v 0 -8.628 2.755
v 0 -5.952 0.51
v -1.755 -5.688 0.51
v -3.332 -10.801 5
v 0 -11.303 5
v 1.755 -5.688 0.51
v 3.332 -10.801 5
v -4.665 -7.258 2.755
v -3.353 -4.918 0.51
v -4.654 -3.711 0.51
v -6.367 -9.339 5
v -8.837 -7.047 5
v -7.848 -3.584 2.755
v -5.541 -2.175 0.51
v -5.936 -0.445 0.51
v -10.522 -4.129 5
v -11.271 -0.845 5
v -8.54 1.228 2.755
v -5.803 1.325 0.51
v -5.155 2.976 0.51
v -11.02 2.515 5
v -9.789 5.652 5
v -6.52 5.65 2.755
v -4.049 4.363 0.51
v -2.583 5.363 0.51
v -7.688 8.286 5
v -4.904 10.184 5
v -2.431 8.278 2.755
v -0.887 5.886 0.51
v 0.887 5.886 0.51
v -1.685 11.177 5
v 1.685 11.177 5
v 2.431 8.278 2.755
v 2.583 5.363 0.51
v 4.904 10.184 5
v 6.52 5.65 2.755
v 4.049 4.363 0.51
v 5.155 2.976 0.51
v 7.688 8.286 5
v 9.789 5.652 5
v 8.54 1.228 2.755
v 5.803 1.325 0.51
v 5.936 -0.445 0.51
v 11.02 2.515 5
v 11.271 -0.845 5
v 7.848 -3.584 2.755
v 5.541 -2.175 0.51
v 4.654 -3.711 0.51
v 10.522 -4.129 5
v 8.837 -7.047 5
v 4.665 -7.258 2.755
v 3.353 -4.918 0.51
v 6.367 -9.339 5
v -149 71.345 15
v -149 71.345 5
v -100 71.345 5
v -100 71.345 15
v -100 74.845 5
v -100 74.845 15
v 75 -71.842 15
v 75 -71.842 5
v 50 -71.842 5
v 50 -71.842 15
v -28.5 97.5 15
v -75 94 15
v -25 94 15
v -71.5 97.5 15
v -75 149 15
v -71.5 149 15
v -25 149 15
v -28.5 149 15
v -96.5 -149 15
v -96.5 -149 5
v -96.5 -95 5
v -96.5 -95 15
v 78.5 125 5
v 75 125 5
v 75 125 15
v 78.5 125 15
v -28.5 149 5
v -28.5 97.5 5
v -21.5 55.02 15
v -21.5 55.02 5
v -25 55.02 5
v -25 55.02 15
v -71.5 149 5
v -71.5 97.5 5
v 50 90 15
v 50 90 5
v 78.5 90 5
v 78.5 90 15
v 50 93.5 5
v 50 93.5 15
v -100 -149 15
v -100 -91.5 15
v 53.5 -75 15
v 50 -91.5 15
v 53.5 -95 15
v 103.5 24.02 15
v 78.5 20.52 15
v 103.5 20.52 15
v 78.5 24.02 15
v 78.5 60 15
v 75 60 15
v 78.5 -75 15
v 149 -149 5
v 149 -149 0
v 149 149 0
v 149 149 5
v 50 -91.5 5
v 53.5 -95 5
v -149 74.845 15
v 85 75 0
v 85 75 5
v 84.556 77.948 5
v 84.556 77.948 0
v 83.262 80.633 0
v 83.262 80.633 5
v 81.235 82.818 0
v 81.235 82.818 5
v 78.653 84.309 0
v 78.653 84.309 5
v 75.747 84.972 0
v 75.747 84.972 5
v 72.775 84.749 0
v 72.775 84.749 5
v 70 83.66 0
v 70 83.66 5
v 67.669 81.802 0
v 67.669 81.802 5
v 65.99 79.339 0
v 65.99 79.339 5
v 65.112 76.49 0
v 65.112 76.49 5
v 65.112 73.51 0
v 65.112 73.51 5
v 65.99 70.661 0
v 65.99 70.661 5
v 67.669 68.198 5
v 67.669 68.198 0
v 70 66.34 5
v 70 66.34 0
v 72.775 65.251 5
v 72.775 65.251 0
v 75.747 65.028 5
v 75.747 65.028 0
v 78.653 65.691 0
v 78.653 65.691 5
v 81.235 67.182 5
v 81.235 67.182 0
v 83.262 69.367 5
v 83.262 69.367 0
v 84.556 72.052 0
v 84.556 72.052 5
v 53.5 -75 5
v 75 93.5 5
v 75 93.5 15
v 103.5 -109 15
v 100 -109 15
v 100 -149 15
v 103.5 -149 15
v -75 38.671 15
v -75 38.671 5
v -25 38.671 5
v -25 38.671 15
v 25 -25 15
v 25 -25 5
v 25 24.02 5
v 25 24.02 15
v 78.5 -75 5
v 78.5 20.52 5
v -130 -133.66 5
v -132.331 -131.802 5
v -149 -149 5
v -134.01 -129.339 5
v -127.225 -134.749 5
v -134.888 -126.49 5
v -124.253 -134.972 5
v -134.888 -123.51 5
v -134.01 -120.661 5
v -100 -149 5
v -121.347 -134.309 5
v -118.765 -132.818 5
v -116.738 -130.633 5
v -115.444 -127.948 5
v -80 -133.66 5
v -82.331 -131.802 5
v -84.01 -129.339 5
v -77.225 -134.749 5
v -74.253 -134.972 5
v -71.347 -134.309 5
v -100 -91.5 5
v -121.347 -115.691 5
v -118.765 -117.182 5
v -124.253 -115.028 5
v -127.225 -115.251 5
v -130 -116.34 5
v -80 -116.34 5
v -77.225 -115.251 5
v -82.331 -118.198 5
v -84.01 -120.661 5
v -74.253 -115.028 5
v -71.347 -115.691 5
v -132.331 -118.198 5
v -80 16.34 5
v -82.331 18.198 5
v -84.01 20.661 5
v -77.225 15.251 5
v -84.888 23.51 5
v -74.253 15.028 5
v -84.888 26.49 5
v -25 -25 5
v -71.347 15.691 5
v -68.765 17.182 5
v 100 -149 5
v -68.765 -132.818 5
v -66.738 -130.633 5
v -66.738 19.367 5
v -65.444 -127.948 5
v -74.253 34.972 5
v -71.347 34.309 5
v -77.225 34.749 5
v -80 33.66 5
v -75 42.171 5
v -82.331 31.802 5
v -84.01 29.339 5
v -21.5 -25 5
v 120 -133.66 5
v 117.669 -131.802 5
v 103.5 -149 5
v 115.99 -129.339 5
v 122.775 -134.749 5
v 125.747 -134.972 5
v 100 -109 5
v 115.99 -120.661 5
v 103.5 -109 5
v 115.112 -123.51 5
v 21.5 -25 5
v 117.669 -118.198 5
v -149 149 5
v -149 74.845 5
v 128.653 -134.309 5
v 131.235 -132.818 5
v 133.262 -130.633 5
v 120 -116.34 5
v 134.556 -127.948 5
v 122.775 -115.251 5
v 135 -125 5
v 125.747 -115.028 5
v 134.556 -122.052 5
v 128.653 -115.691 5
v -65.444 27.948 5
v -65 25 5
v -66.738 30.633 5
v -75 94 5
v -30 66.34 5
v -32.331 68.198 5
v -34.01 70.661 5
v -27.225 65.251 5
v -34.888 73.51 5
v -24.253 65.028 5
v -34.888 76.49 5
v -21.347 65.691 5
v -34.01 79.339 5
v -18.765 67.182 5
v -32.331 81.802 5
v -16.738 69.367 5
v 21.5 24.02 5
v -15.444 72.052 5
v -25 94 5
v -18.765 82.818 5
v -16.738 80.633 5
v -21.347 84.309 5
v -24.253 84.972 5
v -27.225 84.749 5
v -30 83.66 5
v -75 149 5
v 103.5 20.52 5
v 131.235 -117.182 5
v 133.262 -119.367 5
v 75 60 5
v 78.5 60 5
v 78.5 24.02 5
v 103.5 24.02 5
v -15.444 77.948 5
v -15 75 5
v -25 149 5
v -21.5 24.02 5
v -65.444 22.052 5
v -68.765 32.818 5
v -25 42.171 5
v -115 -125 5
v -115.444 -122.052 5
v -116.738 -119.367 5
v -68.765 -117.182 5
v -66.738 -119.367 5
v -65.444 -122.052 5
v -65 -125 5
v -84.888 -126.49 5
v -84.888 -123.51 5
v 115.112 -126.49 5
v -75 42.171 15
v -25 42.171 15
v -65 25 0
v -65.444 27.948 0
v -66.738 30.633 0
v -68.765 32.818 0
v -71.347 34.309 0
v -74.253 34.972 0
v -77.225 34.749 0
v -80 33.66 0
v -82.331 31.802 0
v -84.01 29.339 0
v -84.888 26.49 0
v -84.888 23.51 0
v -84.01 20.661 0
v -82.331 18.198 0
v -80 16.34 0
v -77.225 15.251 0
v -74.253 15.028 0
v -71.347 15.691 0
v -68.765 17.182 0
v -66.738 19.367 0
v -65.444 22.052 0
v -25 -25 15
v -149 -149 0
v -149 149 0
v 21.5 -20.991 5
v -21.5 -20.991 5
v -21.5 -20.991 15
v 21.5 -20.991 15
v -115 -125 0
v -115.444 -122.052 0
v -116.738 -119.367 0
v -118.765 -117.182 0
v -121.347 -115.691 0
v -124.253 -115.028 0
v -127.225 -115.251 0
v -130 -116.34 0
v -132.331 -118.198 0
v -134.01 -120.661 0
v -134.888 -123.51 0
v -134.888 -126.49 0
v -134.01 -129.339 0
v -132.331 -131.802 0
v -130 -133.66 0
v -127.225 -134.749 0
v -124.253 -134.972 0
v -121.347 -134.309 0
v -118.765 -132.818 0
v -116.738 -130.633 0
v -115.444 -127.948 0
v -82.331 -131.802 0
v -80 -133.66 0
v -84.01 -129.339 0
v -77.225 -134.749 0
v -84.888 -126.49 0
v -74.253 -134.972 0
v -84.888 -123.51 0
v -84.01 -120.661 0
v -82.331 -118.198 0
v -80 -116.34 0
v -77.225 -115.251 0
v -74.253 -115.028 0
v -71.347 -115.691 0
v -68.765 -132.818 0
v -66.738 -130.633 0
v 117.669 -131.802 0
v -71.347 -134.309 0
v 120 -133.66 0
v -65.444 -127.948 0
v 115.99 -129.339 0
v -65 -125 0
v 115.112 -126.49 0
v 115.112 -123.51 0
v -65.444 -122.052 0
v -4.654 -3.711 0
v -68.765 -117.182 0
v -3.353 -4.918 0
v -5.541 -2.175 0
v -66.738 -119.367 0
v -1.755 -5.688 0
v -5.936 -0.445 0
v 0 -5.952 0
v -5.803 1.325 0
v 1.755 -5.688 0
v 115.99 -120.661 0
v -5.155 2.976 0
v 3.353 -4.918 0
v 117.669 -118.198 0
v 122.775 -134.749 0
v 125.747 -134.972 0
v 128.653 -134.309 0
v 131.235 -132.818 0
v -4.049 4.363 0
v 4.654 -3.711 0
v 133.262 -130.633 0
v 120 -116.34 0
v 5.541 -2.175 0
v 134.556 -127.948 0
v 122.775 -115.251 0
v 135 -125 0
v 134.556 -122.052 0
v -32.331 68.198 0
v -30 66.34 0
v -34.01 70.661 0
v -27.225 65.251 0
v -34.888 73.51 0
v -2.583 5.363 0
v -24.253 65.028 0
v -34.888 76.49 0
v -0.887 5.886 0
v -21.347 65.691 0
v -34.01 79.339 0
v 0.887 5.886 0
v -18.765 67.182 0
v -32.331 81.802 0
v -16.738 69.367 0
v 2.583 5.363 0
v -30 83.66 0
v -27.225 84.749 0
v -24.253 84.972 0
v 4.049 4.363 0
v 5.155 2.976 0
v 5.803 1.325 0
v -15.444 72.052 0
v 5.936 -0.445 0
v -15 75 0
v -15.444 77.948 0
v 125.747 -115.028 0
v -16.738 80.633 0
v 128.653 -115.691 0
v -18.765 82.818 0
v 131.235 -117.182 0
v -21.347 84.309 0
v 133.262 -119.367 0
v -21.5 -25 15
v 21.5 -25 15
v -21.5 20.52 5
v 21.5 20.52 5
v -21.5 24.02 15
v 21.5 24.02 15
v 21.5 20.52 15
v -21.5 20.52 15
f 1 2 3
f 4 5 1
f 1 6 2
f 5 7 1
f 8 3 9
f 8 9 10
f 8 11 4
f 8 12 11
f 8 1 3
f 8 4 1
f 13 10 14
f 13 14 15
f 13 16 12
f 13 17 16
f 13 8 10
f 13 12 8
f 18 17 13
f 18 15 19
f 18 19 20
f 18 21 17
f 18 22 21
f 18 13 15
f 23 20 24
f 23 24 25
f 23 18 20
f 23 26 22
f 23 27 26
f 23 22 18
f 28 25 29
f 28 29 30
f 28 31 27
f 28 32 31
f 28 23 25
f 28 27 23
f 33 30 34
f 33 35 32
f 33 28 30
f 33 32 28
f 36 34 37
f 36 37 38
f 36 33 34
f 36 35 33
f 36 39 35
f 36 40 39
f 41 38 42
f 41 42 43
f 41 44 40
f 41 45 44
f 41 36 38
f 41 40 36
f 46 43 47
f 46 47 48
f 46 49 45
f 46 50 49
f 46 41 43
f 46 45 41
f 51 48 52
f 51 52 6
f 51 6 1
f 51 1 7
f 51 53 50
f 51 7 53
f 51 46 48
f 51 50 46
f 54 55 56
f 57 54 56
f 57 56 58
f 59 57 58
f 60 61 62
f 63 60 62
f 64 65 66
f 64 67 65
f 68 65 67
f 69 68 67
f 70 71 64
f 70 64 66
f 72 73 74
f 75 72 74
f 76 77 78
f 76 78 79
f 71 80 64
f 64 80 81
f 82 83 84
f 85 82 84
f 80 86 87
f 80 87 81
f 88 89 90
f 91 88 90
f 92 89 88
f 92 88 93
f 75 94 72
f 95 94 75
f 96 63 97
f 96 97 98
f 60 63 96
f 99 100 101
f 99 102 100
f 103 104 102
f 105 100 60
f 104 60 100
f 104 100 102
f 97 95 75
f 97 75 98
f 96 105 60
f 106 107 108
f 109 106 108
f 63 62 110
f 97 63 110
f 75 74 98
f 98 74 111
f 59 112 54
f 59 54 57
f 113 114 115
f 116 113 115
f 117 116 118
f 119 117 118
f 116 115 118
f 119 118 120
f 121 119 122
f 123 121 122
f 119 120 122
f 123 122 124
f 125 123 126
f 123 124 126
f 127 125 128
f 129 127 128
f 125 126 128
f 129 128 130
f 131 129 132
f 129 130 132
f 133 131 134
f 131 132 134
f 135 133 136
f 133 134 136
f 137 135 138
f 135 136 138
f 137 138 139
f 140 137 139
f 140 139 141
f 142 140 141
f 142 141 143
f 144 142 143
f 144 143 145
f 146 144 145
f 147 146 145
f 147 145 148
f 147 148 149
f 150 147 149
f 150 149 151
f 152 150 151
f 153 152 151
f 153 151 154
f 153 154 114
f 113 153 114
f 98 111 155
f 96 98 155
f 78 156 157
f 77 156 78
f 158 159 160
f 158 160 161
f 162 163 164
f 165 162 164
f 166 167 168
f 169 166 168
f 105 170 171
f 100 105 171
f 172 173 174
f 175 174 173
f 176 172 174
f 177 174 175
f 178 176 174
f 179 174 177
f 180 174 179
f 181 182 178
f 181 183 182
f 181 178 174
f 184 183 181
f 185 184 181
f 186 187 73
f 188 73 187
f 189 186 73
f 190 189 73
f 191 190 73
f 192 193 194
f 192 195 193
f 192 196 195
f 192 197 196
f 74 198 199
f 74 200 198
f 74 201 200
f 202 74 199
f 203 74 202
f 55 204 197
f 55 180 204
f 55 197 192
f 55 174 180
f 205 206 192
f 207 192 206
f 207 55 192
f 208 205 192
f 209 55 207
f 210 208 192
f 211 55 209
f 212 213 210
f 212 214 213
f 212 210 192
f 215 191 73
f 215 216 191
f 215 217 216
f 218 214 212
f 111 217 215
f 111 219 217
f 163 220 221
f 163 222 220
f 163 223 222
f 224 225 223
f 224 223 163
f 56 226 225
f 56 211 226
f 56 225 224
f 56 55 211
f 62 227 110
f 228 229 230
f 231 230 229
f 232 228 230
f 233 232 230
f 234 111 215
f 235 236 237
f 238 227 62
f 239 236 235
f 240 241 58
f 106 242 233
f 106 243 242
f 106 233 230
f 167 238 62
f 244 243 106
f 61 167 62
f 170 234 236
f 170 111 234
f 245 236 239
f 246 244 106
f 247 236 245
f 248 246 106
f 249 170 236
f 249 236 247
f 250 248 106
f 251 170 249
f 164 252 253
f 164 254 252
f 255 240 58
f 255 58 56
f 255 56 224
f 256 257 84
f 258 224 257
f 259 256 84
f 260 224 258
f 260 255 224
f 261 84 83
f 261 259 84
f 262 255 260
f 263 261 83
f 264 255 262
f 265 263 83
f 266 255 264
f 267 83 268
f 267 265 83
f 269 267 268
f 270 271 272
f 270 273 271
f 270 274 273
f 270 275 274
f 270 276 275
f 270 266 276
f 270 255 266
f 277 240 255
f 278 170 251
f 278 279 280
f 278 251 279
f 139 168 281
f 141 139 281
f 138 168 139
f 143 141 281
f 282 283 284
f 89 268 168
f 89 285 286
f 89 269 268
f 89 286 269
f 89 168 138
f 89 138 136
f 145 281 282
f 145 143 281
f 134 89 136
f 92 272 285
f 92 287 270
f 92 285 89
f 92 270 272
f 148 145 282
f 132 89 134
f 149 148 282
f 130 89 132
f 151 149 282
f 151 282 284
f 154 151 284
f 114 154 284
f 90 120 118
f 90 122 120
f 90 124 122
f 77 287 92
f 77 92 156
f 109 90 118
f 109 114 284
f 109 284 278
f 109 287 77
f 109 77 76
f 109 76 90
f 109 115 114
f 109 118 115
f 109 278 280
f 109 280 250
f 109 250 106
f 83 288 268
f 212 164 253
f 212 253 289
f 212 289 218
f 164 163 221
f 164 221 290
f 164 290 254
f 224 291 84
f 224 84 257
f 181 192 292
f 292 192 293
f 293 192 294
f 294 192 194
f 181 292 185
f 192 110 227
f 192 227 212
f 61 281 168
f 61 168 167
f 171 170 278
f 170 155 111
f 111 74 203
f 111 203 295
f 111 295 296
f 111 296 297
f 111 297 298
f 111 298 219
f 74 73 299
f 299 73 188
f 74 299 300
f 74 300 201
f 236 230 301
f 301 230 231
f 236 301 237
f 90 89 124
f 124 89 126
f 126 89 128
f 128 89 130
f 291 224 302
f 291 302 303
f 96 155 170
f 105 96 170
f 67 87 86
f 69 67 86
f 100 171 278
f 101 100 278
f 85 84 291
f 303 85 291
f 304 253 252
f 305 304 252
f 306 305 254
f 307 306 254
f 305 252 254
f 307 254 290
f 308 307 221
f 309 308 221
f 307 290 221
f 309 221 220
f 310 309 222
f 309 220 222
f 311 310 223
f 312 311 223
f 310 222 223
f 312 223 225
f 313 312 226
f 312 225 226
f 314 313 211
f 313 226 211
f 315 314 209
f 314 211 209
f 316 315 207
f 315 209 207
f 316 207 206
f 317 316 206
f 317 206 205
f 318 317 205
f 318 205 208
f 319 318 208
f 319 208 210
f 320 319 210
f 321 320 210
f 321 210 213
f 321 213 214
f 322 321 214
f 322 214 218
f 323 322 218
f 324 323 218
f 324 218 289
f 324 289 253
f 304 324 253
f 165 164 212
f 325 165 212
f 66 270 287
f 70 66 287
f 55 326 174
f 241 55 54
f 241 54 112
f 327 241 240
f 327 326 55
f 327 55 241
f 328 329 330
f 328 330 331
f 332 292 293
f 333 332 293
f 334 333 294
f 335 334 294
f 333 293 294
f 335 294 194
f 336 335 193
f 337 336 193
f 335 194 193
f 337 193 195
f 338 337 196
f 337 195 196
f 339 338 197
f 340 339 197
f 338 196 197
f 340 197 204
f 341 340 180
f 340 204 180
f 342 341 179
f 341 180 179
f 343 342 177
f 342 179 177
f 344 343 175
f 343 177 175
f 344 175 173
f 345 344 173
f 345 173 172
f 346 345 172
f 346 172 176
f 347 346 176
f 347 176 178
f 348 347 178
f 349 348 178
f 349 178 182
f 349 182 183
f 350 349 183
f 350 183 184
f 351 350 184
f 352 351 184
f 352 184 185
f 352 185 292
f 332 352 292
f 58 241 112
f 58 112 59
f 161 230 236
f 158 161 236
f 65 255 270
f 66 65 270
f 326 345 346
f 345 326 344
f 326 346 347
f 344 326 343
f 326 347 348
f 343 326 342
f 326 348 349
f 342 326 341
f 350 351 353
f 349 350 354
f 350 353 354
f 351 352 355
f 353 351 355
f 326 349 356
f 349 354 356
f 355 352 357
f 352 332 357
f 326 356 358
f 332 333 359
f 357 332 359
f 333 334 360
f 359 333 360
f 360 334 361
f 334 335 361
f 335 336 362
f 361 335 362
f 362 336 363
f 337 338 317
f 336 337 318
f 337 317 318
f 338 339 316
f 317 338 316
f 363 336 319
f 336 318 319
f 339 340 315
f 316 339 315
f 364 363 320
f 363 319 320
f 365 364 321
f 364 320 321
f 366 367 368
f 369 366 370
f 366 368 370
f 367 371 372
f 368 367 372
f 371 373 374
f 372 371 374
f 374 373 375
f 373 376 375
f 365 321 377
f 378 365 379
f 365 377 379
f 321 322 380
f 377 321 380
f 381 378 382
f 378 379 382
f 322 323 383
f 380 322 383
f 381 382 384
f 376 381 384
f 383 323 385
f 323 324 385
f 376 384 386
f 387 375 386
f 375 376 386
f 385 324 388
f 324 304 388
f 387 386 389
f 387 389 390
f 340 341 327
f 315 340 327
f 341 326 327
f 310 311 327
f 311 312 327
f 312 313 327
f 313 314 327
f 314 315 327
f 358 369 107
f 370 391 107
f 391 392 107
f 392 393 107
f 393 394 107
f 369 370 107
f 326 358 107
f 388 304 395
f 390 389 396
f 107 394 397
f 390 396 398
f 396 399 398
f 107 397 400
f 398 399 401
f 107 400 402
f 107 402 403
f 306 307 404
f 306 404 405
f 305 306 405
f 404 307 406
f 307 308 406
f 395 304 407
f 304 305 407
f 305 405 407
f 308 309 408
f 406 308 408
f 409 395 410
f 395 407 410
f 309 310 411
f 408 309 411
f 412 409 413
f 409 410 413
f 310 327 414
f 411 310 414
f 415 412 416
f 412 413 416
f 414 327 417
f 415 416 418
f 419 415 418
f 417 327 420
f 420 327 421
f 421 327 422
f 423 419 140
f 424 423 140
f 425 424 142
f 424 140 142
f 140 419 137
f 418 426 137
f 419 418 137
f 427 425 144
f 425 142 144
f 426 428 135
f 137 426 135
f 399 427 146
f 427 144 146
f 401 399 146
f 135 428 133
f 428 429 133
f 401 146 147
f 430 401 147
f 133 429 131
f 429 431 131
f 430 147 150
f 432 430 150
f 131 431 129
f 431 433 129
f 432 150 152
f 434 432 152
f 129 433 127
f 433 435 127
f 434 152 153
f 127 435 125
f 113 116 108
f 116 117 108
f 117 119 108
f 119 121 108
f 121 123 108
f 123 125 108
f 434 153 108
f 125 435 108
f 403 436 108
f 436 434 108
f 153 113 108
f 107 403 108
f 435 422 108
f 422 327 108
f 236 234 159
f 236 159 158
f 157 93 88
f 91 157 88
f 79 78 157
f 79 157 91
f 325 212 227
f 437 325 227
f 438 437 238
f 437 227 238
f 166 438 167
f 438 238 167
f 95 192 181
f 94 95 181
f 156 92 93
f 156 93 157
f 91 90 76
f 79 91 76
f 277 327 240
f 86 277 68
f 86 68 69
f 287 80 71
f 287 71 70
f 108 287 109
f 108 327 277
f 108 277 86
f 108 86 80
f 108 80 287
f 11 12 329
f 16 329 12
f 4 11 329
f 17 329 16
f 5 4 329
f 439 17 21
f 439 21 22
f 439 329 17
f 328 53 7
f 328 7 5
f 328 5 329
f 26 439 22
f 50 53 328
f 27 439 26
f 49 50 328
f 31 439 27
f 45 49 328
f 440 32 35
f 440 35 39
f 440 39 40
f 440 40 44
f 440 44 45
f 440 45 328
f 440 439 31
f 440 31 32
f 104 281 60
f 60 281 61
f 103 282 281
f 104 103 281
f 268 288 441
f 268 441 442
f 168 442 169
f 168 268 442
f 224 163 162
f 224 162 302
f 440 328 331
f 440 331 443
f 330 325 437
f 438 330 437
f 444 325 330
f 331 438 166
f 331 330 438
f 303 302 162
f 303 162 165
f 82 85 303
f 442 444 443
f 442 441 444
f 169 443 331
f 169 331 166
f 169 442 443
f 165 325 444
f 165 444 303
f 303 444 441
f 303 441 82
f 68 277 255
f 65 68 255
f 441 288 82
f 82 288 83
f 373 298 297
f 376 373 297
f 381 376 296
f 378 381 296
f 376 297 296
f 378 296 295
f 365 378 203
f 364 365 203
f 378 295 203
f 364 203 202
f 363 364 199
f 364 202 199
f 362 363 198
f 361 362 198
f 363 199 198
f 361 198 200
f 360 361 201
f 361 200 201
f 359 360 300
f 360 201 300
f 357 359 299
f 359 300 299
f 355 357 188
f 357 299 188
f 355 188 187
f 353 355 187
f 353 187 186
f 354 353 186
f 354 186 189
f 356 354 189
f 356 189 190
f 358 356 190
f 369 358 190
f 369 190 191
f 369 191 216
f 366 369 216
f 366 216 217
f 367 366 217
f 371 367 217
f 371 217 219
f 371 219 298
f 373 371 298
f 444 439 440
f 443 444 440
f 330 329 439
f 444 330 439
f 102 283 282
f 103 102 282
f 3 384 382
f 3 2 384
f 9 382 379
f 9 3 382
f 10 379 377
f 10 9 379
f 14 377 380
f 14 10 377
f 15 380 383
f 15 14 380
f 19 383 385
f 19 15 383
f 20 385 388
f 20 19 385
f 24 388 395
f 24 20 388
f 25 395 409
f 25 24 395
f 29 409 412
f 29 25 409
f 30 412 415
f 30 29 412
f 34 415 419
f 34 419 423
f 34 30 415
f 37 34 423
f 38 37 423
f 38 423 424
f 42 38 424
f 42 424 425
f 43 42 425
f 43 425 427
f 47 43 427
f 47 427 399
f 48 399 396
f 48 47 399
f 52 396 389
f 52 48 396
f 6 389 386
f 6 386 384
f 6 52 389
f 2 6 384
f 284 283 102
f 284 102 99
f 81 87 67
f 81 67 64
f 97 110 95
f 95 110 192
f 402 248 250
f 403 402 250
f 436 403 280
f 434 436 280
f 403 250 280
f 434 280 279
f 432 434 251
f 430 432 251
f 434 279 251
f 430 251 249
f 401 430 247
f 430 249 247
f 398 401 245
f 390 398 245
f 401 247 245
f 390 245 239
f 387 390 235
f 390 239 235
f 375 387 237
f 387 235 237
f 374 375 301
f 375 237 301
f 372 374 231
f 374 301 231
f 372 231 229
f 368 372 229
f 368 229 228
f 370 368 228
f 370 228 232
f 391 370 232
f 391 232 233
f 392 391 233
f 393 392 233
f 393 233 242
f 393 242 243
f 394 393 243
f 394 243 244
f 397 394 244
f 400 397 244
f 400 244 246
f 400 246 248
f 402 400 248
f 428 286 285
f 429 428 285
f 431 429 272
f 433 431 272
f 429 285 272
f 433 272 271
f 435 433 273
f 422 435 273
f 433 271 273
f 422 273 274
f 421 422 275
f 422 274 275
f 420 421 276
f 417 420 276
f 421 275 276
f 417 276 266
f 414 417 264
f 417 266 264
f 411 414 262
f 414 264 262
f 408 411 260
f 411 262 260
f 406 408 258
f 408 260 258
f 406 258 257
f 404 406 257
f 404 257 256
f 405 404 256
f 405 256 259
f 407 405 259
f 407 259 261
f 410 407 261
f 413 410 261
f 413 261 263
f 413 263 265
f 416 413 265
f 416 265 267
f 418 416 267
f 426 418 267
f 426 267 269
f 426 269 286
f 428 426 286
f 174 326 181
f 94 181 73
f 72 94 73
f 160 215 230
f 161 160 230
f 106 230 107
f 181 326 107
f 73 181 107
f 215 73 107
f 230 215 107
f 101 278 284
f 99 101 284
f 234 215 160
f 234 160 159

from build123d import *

# Parameters (mm, degrees)
SKETCH3_W           = 298
SKETCH3_H           = 298
BOSS_EXTRUDE2_DEPTH = 5
SKETCH4_R           = 10
CUT_EXTRUDE5_DEPTH  = 56
SKETCH5_W           = 43
SKETCH5_H           = 3.5
SKETCH5_W_2         = 49
SKETCH5_W_3         = 3.5
SKETCH5_H_2         = 49.019827061
SKETCH5_H_3         = 4.008691654
SKETCH5_W_4         = 25
SKETCH5_H_4         = 35
SKETCH5_H_5         = 16.5
SKETCH5_H_6         = 40
SKETCH5_W_5         = 50
BOSS_EXTRUDE6_DEPTH = 10


with BuildPart() as part:
    # Sketch3 → Boss-Extrude2 (new body)
    with BuildSketch(Plane.XY):
        Rectangle(SKETCH3_W, SKETCH3_H)
    extrude(amount=BOSS_EXTRUDE2_DEPTH)

    # Sketch4 → Cut-Extrude5 (cut)
    with BuildSketch(Plane.XY.offset(5)):
        with Locations((-75, 25)):
            Circle(SKETCH4_R)
        with Locations((-25, 75)):
            Circle(SKETCH4_R)
        with Locations((75, 75)):
            Circle(SKETCH4_R)
        with Locations((-75, -125)):
            Circle(SKETCH4_R)
        with Locations((-125, -125)):
            Circle(SKETCH4_R)
        with Locations((125, -125)):
            Circle(SKETCH4_R)
    extrude(amount=-CUT_EXTRUDE5_DEPTH, mode=Mode.SUBTRACT)

    # Sketch5 → Boss-Extrude6 (add)
    with BuildSketch(Plane.XY.offset(5)):
        Polygon((-71.5, 149), (-75, 149), (-75, 94), (-71.5, 94), (-71.5, 97.5), align=None)
        with Locations((-50, 95.75)):
            Rectangle(SKETCH5_W, SKETCH5_H)
        Polygon((-25, 149), (-28.5, 149), (-28.5, 97.5), (-28.5, 94), (-25, 94), align=None)
        with Locations((-124.5, 73.095100697)):
            Rectangle(SKETCH5_W_2, SKETCH5_H)
        Polygon((-25, 38.670579352), (-25, 24.019827061), (-21.5, 24.019827061), (-21.5, 55.019827061), (-25, 55.019827061), (-25, 42.170579352), align=None)
        with Locations((-23.25, -0.490086469)):
            Rectangle(SKETCH5_W_3, SKETCH5_H_2)
        with Locations((0, 22.269827061)):
            Rectangle(SKETCH5_W, SKETCH5_H)
        with Locations((23.25, -0.490086469)):
            Rectangle(SKETCH5_W_3, SKETCH5_H_2)
        with Locations((0, -22.995654173)):
            Rectangle(SKETCH5_W, SKETCH5_H_3)
        Polygon((75, -71.842185644), (75, -75), (78.5, -75), (78.5, 20.519827061), (78.5, 24.019827061), (78.5, 60), (75, 60), align=None)
        with Locations((91, 22.269827061)):
            Rectangle(SKETCH5_W_4, SKETCH5_H)
        with Locations((76.75, 107.5)):
            Rectangle(SKETCH5_W_3, SKETCH5_H_4)
        with Locations((62.5, 91.75)):
            Rectangle(SKETCH5_W_4, SKETCH5_H)
        Polygon((50, -71.842185644), (50, -75), (53.5, -75), (75, -75), (75, -71.842185644), align=None)
        with Locations((51.75, -83.25)):
            Rectangle(SKETCH5_W_3, SKETCH5_H_5)
        Polygon((-96.5, -91.5), (-96.5, -95), (53.5, -95), (53.5, -91.5), (50, -91.5), align=None)
        Polygon((-100, -91.5), (-100, -149), (-96.5, -149), (-96.5, -95), (-96.5, -91.5), align=None)
        with Locations((101.75, -129)):
            Rectangle(SKETCH5_W_3, SKETCH5_H_6)
        with Locations((-50, 40.420579352)):
            Rectangle(SKETCH5_W_5, SKETCH5_H)
    extrude(amount=BOSS_EXTRUDE6_DEPTH)

    # Sketch7 → CSK for 7/16 Flat Head Machine Screw (100)1 (revolve, cut)
    with BuildSketch(Plane(origin=(0, 0, 5), x_dir=(0, -1, 0), z_dir=(1, 0, 0))):
        Polygon((0, 0), (0, 5), (5.95249, 5), (5.95249, 4.489610968), (11.303, 0), align=None)
    revolve(axis=Axis((0, 0, 11.35), (0, 0, -1)), mode=Mode.SUBTRACT)


solid = part.part
